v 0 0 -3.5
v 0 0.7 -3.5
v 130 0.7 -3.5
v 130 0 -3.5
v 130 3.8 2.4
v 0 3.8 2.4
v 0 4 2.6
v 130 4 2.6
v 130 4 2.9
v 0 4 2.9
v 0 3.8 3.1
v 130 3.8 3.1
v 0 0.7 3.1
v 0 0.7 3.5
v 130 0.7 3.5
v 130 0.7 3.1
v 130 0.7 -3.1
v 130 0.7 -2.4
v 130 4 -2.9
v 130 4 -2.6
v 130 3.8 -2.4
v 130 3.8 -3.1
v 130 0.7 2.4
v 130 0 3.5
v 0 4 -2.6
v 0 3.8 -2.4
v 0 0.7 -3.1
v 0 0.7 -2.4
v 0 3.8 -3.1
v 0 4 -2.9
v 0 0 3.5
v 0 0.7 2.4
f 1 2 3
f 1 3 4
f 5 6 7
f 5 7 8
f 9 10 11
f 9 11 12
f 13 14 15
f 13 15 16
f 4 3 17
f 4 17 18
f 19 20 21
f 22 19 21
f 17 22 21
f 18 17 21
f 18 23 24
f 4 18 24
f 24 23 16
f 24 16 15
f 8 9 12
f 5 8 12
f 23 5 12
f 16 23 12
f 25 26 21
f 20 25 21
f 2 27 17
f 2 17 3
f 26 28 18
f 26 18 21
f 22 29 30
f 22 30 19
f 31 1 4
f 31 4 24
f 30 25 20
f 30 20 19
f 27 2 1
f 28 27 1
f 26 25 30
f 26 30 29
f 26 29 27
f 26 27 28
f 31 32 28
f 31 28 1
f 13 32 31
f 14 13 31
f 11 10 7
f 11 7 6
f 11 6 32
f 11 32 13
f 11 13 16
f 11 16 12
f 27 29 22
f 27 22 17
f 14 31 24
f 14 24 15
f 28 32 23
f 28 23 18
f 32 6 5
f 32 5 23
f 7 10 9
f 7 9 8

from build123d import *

# Parameters (mm, degrees)
EXTRUDE_1_DEPTH = 130
CHAMFER_1_SIZE  = 0.2


with BuildPart() as part:
    # 草图1 → 凸台-拉伸1 (new body)
    with BuildSketch(Plane(origin=(0, 0, 0), x_dir=(0, 0, -1), z_dir=(1, 0, 0))):
        Polygon((2.4, 4), (3.1, 4), (3.1, 0.7), (3.5, 0.7), (3.5, 0), (-3.5, 0), (-3.5, 0.7), (-3.1, 0.7), (-3.1, 4), (-2.4, 4), (-2.4, 0.7), (2.4, 0.7), align=None)
    extrude(amount=EXTRUDE_1_DEPTH)

    # 倒角1
    chamfer_1_edges = [part.edges().sort_by_distance(p)[0] for p in [
        (65, 4, 3.1),
        (65, 4, 2.4),
        (65, 4, -2.4),
        (65, 4, -3.1),
    ]]
    chamfer(chamfer_1_edges, length=CHAMFER_1_SIZE)


solid = part.part
